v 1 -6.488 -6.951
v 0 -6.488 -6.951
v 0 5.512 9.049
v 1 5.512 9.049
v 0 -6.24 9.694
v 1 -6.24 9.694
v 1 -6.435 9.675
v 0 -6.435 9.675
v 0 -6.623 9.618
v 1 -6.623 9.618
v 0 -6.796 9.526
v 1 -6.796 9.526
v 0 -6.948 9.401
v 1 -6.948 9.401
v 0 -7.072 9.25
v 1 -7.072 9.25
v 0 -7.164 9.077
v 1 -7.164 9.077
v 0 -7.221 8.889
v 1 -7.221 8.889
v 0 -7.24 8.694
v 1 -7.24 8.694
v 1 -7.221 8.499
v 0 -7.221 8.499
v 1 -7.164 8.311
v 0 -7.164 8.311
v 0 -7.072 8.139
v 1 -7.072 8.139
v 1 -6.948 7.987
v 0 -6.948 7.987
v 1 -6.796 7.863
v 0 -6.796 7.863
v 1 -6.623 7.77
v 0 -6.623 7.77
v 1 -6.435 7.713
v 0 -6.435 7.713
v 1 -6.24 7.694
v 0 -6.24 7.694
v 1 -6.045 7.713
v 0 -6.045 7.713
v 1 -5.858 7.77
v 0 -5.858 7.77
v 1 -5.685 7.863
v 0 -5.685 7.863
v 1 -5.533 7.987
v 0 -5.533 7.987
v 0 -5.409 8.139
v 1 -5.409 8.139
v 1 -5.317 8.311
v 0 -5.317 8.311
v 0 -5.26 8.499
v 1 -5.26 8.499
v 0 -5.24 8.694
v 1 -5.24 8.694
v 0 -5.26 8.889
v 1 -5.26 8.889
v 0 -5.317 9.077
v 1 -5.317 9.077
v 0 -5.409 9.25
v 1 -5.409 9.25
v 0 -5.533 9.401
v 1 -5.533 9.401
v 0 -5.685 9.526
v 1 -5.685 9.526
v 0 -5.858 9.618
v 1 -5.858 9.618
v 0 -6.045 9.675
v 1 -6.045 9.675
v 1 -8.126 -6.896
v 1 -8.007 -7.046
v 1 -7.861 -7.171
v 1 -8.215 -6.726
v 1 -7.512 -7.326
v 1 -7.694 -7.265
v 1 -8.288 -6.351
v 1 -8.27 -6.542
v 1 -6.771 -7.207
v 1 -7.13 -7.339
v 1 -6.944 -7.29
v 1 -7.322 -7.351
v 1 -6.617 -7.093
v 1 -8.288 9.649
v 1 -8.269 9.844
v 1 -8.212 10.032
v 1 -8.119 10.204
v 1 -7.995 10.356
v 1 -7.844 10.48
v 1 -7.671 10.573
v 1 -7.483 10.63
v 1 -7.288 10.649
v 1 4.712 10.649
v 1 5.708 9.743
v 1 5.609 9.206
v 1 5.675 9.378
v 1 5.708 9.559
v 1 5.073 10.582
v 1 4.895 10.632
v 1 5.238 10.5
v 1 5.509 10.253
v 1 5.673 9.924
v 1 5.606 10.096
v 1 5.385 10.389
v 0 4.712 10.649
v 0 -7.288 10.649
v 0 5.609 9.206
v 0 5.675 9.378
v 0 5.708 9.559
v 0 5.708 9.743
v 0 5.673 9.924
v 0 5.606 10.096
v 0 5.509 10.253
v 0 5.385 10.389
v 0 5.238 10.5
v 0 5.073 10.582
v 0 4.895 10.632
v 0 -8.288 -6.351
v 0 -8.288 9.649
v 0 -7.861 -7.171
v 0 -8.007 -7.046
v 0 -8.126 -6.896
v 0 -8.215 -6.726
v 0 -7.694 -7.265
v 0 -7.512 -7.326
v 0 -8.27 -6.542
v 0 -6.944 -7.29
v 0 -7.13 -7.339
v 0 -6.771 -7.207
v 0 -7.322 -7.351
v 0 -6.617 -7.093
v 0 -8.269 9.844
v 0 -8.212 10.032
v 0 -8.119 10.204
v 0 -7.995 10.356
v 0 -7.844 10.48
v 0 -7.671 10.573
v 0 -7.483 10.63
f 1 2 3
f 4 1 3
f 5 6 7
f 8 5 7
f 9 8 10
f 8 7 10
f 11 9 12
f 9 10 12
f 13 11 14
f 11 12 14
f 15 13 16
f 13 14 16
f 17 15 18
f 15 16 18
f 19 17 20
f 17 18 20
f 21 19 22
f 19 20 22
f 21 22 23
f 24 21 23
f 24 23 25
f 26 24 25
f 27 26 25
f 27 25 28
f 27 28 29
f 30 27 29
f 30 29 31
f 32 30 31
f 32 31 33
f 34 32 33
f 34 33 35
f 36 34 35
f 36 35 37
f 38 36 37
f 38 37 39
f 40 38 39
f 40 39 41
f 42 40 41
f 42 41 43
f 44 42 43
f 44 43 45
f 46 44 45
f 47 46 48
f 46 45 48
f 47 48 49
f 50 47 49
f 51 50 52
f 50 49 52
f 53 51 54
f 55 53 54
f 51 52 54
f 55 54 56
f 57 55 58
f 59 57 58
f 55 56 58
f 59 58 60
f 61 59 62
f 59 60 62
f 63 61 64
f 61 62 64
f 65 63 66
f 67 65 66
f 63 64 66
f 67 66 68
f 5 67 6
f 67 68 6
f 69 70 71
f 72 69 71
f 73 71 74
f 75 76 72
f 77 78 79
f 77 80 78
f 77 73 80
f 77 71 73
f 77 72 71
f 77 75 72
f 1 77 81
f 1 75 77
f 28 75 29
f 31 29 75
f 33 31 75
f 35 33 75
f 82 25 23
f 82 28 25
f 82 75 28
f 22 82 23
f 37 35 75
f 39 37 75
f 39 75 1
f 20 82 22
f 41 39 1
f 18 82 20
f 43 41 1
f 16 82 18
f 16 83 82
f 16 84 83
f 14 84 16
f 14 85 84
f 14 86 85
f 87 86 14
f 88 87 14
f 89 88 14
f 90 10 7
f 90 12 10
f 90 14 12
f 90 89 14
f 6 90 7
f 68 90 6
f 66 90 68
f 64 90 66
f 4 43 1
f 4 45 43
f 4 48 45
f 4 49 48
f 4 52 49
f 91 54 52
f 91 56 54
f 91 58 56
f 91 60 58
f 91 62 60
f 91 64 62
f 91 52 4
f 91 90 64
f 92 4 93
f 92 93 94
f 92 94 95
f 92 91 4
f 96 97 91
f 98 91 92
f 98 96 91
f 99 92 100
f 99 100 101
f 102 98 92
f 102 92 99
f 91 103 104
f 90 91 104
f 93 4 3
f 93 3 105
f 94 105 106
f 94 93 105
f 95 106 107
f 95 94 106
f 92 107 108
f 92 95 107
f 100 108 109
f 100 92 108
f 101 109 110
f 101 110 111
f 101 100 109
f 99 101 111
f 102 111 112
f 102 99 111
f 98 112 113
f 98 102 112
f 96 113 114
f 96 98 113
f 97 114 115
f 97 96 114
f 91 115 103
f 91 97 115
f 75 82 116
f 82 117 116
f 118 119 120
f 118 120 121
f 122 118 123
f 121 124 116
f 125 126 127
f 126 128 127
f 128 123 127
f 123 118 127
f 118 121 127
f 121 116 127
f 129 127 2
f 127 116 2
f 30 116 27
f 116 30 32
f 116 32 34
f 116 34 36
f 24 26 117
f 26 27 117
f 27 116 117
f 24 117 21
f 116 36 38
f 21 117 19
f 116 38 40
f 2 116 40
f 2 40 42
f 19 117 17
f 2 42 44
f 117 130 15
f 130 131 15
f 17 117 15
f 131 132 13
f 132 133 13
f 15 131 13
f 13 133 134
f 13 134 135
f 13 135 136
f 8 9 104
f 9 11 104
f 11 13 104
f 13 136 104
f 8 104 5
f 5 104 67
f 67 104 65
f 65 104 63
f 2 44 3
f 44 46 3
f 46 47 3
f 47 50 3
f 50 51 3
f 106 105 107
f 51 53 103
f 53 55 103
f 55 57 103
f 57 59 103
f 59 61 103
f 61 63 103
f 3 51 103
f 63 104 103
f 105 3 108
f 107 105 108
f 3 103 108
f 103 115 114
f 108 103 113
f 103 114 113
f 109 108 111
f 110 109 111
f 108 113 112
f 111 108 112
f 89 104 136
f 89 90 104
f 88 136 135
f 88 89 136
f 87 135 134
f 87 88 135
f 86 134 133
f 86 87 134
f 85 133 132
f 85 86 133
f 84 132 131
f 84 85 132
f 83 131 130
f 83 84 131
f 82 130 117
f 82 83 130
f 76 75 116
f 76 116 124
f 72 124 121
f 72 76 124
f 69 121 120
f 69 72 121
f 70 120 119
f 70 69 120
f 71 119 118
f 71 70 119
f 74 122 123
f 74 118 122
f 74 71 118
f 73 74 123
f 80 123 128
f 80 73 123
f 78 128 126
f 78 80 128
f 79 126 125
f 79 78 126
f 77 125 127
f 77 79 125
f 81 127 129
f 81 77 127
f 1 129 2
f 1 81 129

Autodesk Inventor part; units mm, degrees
ref_plane "YZ Plane" through (0, 0, 0) normal (1, 0, 0) x (0, 1, 0)
ref_plane "XZ Plane" through (0, 0, 0) normal (0, 1, 0) x (-1, 0, 0)
ref_plane "XY Plane" through (0, 0, 0) normal (0, 0, 1) x (1, 0, 0)
sketch "Sketch1" plane through (0, 0, 0) normal (1, 0, 0) x (0, 1, 0)
  line L0 (6.712, 10.6489) -> (-8.288, 10.6489)
  line L1 (-8.288, 10.6489) -> (-8.288, -9.3511)
  line L2 (-8.288, -9.3511) -> (6.712, 10.6489)
  point P0 (0, 0)
  dimension "d0" = 20
  dimension "d1" = 15
extrude "Extrusion1" add sketch "Sketch1" along normal blind 1
fillet "Fillet1" radius 1 3 edges at (0.5, 6.712, 10.6489) (0.5, -8.288, 10.6489) (0.5, -8.288, -9.3511)
sketch "Sketch2" plane through (0, 0, 0) normal (-1, 0, 0) x (0, 0, 1)
  point P0 (0, 0)
  point P1 (8.6941, -6.2404)
hole "Hole1" at (0, -6.2404, 8.6941) direction (1, 0, 0) diameter 2 end through all
properties part number "wing_horn"
